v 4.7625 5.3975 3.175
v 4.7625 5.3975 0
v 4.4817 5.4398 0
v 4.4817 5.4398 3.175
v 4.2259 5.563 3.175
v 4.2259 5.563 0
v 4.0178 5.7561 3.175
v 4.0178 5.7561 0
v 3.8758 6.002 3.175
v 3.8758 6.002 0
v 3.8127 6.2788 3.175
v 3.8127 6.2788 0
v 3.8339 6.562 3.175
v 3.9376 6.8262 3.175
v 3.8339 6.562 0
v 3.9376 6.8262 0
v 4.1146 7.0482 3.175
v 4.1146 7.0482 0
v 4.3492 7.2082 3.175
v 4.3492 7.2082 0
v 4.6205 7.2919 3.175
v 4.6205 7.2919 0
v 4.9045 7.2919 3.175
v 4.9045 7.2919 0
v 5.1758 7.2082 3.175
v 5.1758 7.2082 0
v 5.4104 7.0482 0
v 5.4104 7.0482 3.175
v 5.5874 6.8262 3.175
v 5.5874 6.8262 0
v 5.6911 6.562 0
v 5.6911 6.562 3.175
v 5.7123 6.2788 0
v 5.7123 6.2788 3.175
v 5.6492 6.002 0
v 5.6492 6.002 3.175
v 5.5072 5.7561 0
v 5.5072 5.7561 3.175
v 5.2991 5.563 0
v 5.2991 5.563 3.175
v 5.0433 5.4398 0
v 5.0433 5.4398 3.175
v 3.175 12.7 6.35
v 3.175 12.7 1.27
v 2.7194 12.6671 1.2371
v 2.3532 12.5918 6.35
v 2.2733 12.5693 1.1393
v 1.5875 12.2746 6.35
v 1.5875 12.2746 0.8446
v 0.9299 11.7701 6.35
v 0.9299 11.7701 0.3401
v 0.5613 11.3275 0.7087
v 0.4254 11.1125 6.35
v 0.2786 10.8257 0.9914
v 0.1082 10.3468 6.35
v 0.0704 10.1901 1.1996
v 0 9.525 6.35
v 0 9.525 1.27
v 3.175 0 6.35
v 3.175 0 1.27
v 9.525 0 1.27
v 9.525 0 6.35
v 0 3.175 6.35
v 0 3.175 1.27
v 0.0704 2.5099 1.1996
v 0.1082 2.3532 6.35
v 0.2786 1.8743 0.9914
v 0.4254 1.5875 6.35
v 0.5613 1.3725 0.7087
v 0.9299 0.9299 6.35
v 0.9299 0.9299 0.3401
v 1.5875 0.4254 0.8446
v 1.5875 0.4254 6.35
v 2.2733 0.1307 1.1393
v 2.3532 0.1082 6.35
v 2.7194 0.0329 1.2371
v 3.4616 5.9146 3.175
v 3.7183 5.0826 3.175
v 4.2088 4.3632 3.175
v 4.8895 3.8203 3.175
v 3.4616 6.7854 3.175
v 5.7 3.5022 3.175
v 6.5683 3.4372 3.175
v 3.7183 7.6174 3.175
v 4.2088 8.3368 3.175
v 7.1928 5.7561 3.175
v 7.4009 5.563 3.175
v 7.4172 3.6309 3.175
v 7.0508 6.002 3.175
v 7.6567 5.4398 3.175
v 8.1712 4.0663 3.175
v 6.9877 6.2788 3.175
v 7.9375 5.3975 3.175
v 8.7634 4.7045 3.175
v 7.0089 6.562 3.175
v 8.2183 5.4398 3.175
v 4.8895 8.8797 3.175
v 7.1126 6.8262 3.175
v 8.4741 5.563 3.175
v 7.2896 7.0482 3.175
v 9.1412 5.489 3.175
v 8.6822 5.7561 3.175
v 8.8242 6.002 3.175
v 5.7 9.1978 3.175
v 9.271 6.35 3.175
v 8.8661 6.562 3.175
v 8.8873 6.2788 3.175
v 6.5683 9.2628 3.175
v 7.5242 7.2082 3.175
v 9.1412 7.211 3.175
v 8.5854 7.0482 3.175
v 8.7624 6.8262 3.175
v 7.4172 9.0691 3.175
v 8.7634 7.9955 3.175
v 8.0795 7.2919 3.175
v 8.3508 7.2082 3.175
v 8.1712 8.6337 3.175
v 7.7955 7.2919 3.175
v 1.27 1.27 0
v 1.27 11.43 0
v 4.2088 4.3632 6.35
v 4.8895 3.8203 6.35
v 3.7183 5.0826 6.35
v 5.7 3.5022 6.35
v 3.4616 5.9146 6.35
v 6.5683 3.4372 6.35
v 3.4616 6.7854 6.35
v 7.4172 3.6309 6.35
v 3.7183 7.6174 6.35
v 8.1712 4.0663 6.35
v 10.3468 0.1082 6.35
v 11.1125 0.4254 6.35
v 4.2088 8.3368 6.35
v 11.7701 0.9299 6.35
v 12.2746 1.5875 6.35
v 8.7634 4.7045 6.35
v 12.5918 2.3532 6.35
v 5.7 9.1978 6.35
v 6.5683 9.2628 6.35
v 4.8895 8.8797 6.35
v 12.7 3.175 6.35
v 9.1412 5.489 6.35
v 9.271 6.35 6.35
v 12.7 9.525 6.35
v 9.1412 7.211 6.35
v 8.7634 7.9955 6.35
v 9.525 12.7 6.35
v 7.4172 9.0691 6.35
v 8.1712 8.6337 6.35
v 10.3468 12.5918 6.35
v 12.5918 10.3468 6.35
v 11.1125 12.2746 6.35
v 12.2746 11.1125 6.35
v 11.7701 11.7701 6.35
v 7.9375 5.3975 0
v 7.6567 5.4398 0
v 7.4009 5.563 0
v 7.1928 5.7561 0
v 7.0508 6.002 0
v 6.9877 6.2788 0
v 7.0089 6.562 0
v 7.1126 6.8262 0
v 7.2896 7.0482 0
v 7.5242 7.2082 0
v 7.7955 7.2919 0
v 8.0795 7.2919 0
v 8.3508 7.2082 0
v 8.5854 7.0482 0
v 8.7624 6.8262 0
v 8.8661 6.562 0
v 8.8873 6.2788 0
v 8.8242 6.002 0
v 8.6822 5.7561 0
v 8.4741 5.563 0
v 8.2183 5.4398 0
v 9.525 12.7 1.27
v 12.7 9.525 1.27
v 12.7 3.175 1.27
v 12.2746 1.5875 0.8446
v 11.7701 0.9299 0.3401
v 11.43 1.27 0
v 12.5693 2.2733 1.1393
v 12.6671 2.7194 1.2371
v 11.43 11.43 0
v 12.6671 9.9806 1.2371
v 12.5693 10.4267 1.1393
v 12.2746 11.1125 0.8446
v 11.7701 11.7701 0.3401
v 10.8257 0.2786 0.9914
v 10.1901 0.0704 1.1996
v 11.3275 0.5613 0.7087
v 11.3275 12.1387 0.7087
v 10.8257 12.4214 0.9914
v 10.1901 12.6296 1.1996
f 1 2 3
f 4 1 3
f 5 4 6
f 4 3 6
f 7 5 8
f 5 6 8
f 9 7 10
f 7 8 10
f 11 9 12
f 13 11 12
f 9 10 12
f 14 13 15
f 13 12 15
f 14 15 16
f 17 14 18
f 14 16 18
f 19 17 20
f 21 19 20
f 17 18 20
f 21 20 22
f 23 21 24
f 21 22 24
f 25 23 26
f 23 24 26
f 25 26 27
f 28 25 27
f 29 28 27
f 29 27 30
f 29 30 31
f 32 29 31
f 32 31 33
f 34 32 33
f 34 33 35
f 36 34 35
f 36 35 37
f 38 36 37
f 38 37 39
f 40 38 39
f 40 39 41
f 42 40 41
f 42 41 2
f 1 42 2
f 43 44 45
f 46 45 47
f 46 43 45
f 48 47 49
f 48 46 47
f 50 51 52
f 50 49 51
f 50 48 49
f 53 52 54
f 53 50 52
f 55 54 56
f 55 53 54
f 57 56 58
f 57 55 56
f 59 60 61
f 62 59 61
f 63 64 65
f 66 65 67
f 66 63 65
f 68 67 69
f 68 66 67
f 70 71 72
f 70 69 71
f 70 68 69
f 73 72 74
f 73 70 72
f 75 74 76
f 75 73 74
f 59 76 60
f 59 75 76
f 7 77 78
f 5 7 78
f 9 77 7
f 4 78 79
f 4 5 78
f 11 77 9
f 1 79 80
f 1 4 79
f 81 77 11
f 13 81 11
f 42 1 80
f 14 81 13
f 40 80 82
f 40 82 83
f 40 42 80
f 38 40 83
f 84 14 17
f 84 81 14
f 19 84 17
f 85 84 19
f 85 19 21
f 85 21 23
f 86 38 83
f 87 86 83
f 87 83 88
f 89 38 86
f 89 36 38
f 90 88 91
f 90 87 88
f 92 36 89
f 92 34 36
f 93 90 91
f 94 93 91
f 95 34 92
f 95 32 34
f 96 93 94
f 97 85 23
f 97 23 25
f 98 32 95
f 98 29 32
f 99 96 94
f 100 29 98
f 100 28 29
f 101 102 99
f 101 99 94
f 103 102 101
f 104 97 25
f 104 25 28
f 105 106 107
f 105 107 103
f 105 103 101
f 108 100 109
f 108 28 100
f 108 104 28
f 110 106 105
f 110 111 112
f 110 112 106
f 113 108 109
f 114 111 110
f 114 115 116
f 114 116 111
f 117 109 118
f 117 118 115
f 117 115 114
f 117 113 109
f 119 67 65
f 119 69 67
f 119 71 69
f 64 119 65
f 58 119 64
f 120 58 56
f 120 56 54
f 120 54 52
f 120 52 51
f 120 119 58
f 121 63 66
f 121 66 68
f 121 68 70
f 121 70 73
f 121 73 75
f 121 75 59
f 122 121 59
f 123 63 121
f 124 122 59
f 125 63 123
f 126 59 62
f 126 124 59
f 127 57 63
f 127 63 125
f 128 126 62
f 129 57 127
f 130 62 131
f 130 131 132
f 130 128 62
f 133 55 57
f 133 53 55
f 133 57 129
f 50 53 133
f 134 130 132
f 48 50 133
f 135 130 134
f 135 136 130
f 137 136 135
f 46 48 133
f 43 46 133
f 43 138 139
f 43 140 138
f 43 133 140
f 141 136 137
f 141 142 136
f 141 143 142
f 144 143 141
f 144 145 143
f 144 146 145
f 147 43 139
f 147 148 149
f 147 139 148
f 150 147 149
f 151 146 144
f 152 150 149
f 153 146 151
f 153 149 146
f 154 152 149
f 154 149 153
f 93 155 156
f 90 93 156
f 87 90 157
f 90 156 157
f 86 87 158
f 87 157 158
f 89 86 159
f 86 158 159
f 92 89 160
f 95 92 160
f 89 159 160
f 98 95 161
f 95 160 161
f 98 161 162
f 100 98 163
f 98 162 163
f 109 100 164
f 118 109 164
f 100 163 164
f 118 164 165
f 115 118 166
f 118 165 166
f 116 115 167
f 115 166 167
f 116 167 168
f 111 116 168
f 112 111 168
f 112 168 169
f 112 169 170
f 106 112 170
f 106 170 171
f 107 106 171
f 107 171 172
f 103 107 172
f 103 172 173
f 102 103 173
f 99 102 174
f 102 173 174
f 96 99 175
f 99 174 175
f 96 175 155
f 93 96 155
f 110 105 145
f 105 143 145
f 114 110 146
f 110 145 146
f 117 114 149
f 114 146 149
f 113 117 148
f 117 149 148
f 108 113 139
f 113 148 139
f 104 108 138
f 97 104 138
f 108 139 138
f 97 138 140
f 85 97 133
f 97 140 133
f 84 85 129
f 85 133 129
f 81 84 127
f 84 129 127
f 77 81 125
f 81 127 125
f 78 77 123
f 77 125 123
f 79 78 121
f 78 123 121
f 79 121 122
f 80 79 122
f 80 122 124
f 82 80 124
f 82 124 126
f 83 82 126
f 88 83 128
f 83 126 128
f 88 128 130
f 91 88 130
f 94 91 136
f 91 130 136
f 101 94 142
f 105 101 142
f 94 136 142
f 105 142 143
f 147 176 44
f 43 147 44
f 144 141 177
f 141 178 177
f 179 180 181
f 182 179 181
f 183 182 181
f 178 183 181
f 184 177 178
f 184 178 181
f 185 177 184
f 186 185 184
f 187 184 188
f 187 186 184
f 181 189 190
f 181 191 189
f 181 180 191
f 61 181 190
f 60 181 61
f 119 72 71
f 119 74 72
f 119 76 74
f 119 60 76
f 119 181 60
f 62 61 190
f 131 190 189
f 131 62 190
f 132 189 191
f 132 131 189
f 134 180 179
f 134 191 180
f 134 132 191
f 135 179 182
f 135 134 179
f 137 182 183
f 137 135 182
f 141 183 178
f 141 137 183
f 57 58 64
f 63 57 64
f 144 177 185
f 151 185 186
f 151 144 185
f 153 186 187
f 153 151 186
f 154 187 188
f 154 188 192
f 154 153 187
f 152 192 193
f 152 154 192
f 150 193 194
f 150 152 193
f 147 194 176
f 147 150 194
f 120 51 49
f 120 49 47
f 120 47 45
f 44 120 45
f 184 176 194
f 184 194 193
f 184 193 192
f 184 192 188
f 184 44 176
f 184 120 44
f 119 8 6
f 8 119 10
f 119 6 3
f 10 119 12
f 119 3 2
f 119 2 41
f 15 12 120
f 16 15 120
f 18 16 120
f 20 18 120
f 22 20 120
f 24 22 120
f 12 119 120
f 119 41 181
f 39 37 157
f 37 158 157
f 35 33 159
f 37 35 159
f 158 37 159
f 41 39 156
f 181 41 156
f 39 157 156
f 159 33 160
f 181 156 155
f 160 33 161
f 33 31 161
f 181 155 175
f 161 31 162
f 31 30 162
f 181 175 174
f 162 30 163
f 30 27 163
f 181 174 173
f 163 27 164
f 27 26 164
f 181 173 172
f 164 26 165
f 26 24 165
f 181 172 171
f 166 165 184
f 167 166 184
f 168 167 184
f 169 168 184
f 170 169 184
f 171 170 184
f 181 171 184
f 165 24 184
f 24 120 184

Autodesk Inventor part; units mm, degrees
ref_plane "YZ Plane" through (0, 0, 0) normal (1, 0, 0) x (0, 1, 0)
ref_plane "XZ Plane" through (0, 0, 0) normal (0, 1, 0) x (-1, 0, 0)
ref_plane "XY Plane" through (0, 0, 0) normal (0, 0, 1) x (1, 0, 0)
sketch "Sketch1" plane through (0, 0, 0) normal (0, 0, 1) x (1, 0, 0)
  line L0 (0, 0) -> (12.7, 0)
  line L1 (12.7, 0) -> (12.7, 12.7)
  line L2 (12.7, 12.7) -> (0, 12.7)
  line L3 (0, 12.7) -> (0, 0)
  dimension "d0" = 12.7
  dimension "d1" = 12.7
extrude "Extrusion1" add sketch "Sketch1" along normal blind 6.35
sketch "Sketch2" plane through (0, 0, 6.35) normal (0, 0, 1) x (1, 0, 0)
  line L0 (12.7, 12.7) -> (0, 12.7) construction
  line L1 (0, 0) -> (12.7, 0) construction
  line L2 (0, 12.7) -> (12.7, 0) construction
  line L3 (0, 0) -> (12.7, 12.7) construction
  circle A0 centre (6.35, 6.35) radius 2.921
  dimension "d4" = 5.842
extrude "Extrusion2" cut sketch "Sketch2" against normal blind 3.175
sketch "Sketch3" plane through (6.35, 6.35, 3.175) normal (0, 0, 1) x (1, 0, 0)
  circle A0 centre (0, 0) radius 2.921 construction
  line L0 (-6.35, 0) -> (6.35, 0) construction
  line L1 (-6.35, 6.35) -> (-6.35, -6.35) construction
  line L2 (6.35, -6.35) -> (6.35, 6.35) construction
  circle A1 centre (-1.5875, 0) radius 0.635 construction
  circle A2 centre (1.5875, 0) radius 0.635 construction
  line L3 (-0.9525, 6.35) -> (-0.9525, -6.35) construction
  line L4 (0.9525, -6.35) -> (0.9525, 6.35) construction
  point P0 (1.5875, 0)
  dimension "d7" = 1.27
  dimension "d8" = 1.27
  dimension "d9" = 1.5875
  dimension "d10" = 1.5875
  dimension "d11" = 1.905
  dimension "d26" = 3.175
hole "Hole1" at (4.7625, 6.35, 3.175) at (7.9375, 6.35, 3.175) direction (0, 0, -1) diameter 1.905 end through all
chamfer "Chamfer2" distance 1.27 angle 45 4 edges at (6.35, 0, 0) (12.7, 6.35, 0) (6.35, 12.7, 0) (0, 6.35, 0)
fillet "Fillet1" radius 3.175 4 edges at (12.7, 0, 3.81) (12.7, 12.7, 3.81) (0, 12.7, 3.81) (0, 0, 3.81)
equation "\"d10\" = d9"
properties part number "testled"
